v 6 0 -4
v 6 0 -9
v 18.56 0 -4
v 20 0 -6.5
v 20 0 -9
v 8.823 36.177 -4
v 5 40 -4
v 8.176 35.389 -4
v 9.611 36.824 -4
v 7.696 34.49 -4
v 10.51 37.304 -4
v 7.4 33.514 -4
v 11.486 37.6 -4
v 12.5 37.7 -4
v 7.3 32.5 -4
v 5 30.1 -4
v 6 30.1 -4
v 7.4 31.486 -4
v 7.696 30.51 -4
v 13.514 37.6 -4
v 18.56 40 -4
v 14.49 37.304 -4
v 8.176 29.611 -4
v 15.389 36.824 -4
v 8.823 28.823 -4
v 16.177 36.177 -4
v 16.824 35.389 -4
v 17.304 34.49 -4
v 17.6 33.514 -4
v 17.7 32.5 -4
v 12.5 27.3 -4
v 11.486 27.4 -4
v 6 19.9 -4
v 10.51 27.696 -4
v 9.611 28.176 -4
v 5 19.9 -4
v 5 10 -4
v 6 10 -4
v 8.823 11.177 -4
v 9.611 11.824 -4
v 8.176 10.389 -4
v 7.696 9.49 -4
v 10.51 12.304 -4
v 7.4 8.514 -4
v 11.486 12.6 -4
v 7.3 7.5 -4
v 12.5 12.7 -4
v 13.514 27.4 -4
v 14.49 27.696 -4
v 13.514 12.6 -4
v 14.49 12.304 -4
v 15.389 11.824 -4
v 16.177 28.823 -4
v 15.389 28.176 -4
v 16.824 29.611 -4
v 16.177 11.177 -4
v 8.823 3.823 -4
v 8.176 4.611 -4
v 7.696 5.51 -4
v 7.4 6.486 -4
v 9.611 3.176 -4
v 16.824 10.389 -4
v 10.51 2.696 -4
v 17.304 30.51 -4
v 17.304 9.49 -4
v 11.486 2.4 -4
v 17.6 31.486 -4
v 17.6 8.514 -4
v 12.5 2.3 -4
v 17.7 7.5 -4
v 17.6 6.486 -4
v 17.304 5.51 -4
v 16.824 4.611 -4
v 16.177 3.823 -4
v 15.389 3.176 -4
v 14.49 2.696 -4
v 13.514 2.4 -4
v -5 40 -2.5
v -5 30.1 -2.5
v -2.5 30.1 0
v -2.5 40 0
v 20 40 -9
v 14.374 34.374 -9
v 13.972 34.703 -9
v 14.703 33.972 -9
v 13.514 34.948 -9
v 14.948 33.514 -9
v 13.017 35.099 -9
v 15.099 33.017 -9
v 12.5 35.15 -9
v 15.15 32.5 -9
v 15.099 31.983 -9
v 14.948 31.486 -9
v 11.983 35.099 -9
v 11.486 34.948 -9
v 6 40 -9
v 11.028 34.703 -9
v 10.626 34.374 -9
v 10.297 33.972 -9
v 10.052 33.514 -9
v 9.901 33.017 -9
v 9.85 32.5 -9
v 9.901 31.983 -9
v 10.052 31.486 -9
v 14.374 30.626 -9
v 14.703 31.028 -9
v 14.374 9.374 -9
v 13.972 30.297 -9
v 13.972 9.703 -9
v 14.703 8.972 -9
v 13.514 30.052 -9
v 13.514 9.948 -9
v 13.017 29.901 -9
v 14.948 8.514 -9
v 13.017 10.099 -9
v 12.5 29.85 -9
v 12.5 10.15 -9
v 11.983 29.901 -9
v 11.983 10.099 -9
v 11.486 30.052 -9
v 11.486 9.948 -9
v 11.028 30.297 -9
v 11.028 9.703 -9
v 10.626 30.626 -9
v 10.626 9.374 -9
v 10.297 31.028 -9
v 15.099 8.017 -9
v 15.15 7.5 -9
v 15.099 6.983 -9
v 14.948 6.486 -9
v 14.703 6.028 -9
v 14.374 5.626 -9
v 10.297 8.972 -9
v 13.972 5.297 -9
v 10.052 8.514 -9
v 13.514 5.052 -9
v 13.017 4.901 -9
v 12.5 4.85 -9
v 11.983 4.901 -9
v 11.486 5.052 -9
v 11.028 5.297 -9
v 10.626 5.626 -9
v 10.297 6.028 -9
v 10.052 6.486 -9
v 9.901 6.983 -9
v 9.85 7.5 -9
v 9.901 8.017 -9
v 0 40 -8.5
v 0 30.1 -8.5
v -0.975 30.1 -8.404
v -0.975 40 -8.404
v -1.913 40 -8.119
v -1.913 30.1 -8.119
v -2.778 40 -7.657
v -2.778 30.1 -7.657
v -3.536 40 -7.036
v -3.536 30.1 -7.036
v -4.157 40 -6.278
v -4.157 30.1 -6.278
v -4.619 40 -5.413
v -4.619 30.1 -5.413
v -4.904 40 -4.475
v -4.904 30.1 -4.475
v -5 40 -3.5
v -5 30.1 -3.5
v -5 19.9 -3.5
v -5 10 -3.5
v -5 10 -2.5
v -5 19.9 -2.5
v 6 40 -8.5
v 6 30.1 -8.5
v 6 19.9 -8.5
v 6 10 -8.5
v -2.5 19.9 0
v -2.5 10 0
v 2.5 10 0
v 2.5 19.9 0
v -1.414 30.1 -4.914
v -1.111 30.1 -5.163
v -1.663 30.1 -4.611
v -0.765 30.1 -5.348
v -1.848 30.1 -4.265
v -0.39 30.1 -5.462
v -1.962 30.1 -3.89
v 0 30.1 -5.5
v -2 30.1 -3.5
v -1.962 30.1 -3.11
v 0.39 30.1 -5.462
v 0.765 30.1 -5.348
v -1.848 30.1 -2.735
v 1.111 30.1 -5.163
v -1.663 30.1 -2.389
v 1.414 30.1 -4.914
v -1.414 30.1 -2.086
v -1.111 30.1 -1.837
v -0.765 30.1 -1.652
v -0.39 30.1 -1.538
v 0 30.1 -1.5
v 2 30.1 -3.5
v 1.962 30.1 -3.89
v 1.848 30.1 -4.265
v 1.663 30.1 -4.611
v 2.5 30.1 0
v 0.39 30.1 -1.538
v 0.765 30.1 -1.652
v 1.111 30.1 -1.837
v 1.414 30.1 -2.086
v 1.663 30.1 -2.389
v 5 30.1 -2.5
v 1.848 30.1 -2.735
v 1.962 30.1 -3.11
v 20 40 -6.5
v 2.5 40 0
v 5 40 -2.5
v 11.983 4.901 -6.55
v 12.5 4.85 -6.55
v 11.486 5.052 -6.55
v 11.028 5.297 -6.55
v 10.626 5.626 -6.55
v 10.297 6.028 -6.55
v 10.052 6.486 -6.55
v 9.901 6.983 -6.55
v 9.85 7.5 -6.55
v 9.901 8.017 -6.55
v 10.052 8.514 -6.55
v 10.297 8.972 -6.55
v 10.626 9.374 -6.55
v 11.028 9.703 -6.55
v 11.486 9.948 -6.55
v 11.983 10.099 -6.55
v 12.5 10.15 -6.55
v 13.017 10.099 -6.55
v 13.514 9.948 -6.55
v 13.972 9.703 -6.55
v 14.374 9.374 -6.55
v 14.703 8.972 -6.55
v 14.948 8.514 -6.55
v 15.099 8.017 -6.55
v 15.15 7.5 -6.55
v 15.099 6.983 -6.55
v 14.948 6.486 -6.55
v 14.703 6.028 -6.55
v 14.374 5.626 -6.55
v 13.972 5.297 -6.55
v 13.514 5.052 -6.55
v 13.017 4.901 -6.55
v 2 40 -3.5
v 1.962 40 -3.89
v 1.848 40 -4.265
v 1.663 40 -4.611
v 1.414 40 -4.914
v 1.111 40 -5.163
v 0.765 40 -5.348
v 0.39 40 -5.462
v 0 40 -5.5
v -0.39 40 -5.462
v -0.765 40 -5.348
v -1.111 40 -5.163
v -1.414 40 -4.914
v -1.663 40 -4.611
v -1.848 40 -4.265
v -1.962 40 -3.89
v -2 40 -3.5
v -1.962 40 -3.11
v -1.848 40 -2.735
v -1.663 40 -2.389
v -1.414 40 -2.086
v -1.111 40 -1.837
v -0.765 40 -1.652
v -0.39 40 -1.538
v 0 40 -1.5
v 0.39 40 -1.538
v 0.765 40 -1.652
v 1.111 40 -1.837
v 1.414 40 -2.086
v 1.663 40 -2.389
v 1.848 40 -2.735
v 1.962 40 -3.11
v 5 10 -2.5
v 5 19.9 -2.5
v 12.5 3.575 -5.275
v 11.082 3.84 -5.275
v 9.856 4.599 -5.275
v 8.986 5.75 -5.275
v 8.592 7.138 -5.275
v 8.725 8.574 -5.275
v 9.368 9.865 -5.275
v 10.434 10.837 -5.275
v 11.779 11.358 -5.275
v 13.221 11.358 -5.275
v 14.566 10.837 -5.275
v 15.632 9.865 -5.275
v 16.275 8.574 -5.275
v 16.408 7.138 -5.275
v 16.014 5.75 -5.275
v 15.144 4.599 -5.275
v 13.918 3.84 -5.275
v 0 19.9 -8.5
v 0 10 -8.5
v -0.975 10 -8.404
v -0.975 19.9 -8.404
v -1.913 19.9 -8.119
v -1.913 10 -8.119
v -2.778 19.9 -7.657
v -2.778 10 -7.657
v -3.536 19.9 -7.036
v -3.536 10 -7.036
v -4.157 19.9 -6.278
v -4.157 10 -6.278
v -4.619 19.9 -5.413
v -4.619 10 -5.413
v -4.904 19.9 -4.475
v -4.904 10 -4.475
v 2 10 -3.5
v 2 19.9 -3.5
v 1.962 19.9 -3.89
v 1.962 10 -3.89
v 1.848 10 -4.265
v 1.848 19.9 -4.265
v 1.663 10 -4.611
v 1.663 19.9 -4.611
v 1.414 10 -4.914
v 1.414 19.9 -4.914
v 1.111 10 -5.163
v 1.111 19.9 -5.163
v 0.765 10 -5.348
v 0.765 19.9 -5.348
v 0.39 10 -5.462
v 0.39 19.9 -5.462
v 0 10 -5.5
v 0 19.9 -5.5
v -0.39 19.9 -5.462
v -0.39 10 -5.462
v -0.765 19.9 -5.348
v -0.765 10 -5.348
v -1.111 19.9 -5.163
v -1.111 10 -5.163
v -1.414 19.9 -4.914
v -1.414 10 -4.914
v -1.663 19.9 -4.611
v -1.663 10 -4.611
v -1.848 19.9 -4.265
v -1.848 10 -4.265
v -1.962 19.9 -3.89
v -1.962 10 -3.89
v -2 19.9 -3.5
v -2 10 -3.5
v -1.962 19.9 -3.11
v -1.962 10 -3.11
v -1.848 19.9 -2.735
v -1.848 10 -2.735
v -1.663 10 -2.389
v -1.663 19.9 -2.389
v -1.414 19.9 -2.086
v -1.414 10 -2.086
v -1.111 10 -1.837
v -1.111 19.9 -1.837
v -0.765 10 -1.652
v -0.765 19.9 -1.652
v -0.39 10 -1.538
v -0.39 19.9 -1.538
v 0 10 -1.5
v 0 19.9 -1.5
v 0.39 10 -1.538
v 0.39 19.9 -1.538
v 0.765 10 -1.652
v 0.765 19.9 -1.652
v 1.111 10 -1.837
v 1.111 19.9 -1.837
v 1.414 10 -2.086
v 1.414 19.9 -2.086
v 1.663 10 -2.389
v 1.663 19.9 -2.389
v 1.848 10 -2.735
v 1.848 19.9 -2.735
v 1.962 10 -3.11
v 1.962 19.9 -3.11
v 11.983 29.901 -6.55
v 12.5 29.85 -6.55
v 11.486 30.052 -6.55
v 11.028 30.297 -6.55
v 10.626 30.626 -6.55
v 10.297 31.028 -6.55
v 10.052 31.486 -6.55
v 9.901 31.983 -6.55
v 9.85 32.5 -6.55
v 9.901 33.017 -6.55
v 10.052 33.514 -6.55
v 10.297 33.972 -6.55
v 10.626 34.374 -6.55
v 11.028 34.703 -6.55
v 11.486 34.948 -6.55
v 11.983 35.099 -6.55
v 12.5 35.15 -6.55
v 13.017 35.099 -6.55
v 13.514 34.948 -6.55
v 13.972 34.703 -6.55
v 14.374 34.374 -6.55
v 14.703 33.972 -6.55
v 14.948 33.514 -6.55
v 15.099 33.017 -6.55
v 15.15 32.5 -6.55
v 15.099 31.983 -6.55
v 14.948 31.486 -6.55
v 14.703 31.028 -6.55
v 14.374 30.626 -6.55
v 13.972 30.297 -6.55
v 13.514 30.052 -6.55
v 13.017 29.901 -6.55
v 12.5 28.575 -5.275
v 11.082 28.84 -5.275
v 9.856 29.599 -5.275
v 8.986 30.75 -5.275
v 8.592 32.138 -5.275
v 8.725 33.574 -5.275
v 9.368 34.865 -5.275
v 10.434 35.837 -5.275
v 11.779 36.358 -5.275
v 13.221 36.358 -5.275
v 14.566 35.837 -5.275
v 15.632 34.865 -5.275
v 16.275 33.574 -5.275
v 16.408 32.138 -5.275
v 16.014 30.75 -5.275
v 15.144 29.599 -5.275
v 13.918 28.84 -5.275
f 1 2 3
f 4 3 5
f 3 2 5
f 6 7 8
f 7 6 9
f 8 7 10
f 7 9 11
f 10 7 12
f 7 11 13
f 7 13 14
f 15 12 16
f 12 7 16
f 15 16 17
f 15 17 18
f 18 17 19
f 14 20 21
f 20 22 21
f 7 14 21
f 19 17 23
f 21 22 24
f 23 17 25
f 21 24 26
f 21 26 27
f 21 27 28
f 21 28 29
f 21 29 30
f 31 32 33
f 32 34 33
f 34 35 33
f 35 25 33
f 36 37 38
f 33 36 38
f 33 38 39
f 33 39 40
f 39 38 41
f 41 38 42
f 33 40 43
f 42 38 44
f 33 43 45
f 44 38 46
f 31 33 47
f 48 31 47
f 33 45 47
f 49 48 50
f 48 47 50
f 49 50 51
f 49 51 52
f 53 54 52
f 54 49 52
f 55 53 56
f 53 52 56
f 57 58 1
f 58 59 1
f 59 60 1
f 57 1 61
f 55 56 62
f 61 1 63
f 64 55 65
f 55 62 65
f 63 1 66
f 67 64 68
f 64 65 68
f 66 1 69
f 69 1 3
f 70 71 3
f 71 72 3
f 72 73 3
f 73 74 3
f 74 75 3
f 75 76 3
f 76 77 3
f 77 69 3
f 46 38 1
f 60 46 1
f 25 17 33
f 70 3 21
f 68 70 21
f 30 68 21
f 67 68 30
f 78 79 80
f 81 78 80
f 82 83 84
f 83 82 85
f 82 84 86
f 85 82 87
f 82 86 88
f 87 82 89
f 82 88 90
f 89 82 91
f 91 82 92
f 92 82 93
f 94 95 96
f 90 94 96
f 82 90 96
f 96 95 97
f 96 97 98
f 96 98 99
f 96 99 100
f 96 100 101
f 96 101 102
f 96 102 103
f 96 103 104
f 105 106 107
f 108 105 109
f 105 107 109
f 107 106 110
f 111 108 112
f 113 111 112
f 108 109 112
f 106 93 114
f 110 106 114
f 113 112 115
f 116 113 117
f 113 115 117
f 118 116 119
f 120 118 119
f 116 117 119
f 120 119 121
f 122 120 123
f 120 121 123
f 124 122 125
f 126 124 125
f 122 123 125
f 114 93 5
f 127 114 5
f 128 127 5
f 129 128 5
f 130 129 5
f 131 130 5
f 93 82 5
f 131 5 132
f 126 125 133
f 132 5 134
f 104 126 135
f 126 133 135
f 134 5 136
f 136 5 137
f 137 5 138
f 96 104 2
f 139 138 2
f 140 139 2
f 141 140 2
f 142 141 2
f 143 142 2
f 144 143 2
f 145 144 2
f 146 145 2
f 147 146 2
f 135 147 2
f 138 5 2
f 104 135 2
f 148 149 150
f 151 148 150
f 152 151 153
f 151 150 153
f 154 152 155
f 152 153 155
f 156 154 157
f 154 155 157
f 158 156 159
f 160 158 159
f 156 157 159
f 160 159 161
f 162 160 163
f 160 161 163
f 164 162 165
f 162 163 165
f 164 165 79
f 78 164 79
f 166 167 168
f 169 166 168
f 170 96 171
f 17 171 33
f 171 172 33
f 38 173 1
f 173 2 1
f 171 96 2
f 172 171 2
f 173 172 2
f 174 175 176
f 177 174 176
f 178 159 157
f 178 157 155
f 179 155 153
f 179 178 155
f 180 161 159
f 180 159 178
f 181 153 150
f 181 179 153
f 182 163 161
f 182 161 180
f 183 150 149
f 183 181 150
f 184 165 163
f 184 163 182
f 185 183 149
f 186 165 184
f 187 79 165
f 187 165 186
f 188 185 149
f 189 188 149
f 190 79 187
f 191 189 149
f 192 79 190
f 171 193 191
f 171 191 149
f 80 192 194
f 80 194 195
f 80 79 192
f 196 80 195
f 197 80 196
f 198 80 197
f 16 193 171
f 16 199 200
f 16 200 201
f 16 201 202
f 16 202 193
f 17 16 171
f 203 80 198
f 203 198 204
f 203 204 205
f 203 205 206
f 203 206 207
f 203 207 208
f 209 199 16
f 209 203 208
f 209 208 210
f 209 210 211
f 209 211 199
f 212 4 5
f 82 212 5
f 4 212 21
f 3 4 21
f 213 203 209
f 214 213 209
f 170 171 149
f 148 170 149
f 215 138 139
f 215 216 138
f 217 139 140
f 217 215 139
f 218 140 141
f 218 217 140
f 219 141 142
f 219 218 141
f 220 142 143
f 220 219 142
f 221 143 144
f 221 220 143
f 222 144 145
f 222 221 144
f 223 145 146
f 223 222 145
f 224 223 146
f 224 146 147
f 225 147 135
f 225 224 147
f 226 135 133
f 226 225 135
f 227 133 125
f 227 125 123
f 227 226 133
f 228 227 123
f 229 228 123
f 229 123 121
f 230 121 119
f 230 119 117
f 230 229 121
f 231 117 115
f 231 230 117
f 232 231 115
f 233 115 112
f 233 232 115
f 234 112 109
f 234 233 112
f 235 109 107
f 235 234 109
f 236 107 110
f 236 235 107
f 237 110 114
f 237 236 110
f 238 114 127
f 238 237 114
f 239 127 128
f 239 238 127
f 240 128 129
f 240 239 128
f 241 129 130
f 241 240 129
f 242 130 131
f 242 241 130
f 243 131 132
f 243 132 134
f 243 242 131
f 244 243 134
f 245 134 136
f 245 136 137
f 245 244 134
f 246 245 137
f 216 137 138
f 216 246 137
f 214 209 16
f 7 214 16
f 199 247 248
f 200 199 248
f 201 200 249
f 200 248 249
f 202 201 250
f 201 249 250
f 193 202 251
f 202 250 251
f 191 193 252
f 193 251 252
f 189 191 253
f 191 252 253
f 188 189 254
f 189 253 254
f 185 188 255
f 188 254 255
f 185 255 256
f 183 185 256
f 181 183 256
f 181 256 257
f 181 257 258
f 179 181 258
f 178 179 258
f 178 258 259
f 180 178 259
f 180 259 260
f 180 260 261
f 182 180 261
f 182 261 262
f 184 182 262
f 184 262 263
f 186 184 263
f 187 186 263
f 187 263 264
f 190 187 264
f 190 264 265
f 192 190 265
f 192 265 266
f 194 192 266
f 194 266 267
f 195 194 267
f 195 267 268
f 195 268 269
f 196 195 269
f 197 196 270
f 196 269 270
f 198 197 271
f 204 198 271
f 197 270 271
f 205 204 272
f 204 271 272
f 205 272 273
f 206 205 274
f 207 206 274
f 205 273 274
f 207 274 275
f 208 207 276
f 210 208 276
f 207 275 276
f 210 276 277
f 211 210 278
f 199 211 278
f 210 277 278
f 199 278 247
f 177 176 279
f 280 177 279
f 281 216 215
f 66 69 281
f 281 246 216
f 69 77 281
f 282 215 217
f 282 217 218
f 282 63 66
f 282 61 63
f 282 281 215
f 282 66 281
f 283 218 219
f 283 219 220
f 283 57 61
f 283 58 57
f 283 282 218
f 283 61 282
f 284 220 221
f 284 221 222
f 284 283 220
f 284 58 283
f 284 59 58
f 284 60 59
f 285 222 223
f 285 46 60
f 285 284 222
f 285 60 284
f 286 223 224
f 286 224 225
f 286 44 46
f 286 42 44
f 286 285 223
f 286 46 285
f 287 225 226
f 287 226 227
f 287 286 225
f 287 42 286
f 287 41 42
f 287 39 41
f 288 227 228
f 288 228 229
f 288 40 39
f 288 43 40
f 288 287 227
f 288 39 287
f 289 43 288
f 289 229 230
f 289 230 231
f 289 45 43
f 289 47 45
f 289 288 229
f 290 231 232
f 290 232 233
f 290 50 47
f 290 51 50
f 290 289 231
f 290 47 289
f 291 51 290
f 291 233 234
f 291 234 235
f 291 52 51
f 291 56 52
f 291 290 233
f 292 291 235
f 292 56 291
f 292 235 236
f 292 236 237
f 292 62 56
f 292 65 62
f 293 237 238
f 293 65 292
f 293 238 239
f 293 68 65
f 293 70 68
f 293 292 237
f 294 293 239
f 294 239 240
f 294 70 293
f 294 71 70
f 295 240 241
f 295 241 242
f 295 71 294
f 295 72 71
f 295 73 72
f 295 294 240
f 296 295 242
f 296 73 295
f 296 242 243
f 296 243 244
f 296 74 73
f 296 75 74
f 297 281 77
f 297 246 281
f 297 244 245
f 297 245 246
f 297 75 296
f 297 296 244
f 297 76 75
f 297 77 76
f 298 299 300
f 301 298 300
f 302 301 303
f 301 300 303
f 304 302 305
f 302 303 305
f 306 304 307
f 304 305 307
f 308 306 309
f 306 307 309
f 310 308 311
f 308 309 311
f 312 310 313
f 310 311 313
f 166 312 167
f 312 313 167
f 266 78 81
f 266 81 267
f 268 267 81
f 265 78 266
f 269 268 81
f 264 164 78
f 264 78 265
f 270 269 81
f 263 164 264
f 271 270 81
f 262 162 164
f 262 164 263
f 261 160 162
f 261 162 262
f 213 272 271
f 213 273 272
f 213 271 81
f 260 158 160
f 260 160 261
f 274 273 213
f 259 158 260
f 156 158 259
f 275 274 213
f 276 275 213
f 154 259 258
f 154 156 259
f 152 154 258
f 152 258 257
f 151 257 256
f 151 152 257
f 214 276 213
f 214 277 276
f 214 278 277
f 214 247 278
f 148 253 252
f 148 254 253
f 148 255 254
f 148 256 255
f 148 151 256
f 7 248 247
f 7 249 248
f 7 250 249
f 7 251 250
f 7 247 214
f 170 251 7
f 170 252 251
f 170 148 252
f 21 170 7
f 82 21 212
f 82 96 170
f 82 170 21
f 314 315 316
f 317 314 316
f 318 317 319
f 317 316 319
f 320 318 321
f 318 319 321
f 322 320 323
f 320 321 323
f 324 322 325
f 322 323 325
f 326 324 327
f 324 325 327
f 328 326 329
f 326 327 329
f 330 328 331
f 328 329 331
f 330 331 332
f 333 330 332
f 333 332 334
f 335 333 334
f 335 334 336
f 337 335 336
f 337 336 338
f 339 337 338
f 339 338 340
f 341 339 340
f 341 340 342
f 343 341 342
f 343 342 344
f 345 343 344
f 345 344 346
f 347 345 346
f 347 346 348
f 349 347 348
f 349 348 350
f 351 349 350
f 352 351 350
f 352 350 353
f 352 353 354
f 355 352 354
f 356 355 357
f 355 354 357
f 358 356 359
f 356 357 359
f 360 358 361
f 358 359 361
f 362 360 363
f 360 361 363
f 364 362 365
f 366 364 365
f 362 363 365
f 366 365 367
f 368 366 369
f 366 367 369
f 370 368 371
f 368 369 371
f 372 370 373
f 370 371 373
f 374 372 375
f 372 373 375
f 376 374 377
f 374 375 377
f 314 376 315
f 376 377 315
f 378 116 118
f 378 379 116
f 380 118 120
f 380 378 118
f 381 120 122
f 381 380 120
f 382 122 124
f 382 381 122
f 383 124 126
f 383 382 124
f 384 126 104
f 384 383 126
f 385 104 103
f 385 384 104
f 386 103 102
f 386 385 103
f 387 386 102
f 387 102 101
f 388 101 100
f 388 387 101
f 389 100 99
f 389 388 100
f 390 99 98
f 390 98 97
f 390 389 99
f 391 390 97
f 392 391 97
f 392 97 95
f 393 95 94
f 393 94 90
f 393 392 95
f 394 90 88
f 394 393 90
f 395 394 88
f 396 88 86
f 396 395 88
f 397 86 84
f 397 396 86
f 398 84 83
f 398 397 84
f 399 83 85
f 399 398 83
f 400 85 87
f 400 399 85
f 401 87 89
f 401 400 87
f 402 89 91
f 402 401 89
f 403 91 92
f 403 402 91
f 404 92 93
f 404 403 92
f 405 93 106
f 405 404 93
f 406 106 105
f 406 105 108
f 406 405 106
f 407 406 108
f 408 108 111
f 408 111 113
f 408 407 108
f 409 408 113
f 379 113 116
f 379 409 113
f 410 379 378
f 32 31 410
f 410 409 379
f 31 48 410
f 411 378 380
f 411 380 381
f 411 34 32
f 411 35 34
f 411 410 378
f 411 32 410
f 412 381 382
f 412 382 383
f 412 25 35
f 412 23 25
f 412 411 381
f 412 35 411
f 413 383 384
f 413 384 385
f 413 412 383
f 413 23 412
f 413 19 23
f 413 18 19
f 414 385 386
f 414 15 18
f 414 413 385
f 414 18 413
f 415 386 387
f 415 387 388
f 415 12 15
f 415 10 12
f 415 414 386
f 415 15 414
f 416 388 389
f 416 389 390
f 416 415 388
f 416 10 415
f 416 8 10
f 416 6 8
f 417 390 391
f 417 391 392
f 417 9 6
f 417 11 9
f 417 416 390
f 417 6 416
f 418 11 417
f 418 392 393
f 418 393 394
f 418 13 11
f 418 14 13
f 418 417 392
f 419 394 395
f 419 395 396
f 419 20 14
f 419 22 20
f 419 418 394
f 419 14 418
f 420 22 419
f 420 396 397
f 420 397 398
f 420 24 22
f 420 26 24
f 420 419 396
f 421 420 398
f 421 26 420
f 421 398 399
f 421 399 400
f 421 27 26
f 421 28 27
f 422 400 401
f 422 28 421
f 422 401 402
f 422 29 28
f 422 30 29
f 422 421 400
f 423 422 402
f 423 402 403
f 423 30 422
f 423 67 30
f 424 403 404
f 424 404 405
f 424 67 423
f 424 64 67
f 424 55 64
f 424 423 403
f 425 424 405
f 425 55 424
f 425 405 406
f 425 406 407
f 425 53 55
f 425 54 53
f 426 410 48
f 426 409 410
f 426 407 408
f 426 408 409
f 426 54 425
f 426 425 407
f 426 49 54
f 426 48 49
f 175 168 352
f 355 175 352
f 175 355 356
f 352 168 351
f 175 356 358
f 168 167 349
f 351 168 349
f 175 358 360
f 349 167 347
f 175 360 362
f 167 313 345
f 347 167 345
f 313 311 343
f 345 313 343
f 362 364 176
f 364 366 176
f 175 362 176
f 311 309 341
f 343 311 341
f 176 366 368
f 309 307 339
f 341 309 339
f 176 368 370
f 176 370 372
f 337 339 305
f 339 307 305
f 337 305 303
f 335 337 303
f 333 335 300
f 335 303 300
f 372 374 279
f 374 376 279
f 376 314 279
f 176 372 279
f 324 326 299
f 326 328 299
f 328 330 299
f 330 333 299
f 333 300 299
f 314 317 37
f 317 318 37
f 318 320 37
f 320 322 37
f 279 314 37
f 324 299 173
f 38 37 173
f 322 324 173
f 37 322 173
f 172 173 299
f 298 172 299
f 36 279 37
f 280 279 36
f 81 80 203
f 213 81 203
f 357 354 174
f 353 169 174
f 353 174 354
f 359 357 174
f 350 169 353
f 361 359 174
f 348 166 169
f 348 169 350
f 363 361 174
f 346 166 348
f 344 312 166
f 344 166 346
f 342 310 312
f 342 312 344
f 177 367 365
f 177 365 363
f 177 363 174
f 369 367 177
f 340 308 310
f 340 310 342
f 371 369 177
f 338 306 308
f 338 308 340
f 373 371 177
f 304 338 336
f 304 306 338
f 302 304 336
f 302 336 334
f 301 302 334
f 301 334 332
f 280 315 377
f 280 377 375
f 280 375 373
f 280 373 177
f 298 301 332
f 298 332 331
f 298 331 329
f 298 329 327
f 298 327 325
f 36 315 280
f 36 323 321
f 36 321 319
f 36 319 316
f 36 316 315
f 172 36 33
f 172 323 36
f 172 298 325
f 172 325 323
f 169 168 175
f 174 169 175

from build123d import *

# Parameters (mm, degrees)
BOSS_EXTRUDE1_DEPTH                            = 40
CUT_EXTRUDE1_DEPTH                             = 40
CSK_FOR_M5_FLAT_HEAD_MACHINE_SCREW1_AT_2_COUNT = 2
CSK_FOR_M5_FLAT_HEAD_MACHINE_SCREW1_AT_2_PITCH = 25
SKETCH7_R                                      = 2
CUT_EXTRUDE2_DEPTH                             = 40
SKETCH8_W                                      = 1
SKETCH8_H                                      = 10.2
CUT_EXTRUDE3_DEPTH                             = 10
SKETCH9_W                                      = 11.70124712
SKETCH9_H                                      = 10.2
CUT_EXTRUDE4_DEPTH                             = 10
CUT_EXTRUDE4_DEPTH_BACK                        = 10
SKETCH10_W                                     = 1
SKETCH10_H                                     = 10
CUT_EXTRUDE5_DEPTH                             = 10
SKETCH11_W                                     = 12.165826364
SKETCH11_H                                     = 10.874220792
CUT_EXTRUDE6_DEPTH                             = 10
CUT_EXTRUDE6_DEPTH_BACK                        = 10


with BuildPart() as part:
    # Sketch2 → Boss-Extrude1 (new body)
    with BuildSketch(Plane(origin=(0, 0, 0), x_dir=(1, 0, 0), z_dir=(0, 1, 0))):
        with BuildLine():
            Line((-2.5, 0), (2.5, 0))
            Line((2.5, 0), (5, 2.5))
            Line((5, 2.5), (5, 4))
            Line((5, 4), (20, 4))
            Line((20, 4), (20, 9))
            Line((20, 9), (6, 9))
            Line((6, 9), (6, 8.5))
            Line((6, 8.5), (0, 8.5))
            ThreePointArc((0, 8.5), (-3.535533906, 7.035533906), (-5, 3.5))
            Line((-5, 3.5), (-5, 2.5))
            Line((-5, 2.5), (-2.5, 0))
        make_face()
    extrude(amount=BOSS_EXTRUDE1_DEPTH)

    # Sketch3 → Cut-Extrude1 (cut)
    with BuildSketch(Plane(origin=(0, 40, 0), x_dir=(1, 0, 0), z_dir=(0, 1, 0))):
        Polygon((20, 6.5), (18.56, 4), (20, 4), align=None)
    extrude(amount=-CUT_EXTRUDE1_DEPTH, mode=Mode.SUBTRACT)

    # Sketch6 → CSK for M5 Flat Head Machine Screw1 (revolve, cut)
    with BuildSketch(Plane(origin=(12.5, 32.5, -4), x_dir=(0, -1, 0), z_dir=(1, 0, 0))):
        Polygon((0, 0), (0, 5), (2.65, 5), (2.65, 2.55), (5.2, 0), align=None)
    csk_for_m5_flat_head_machine_screw1 = revolve(axis=Axis((12.5, 32.5, 2.35), (0, 0, -1)), mode=Mode.SUBTRACT)

    # CSK for M5 Flat Head Machine Screw1 at 2: CSK for M5 Flat Head Machine Screw1 ×2
    with Locations(*[(0, -i * CSK_FOR_M5_FLAT_HEAD_MACHINE_SCREW1_AT_2_PITCH, 0) for i in range(1, CSK_FOR_M5_FLAT_HEAD_MACHINE_SCREW1_AT_2_COUNT)]):
        add(csk_for_m5_flat_head_machine_screw1, mode=Mode.SUBTRACT)

    # Sketch7 → Cut-Extrude2 (cut)
    with BuildSketch(Plane(origin=(0, 40, 0), x_dir=(1, 0, 0), z_dir=(0, 1, 0))):
        with Locations((0, 3.5)):
            Circle(SKETCH7_R)
    extrude(amount=-CUT_EXTRUDE2_DEPTH, mode=Mode.SUBTRACT)

    # Sketch8 → Cut-Extrude3 (cut)
    with BuildSketch(Plane.XY.offset(-4)):
        with Locations((5.5, 25)):
            Rectangle(SKETCH8_W, SKETCH8_H)
    extrude(amount=-CUT_EXTRUDE3_DEPTH, mode=Mode.SUBTRACT)

    # Sketch9 → Cut-Extrude4 (cut, two sides)
    with BuildSketch(Plane.XY.offset(-4)) as cut_extrude4_sk:
        with Locations((0.14937644, 25)):
            Rectangle(SKETCH9_W, SKETCH9_H)
    extrude(amount=CUT_EXTRUDE4_DEPTH, mode=Mode.SUBTRACT)
    extrude(cut_extrude4_sk.sketch, amount=-CUT_EXTRUDE4_DEPTH_BACK, mode=Mode.SUBTRACT)

    # Sketch10 → Cut-Extrude5 (cut)
    with BuildSketch(Plane.XY.offset(-4)):
        with Locations((5.5, 5)):
            Rectangle(SKETCH10_W, SKETCH10_H)
    extrude(amount=-CUT_EXTRUDE5_DEPTH, mode=Mode.SUBTRACT)

    # Sketch11 → Cut-Extrude6 (cut, two sides)
    with BuildSketch(Plane.XY.offset(-4)) as cut_extrude6_sk:
        with Locations((-0.082913182, 4.562889604)):
            Rectangle(SKETCH11_W, SKETCH11_H)
    extrude(amount=CUT_EXTRUDE6_DEPTH, mode=Mode.SUBTRACT)
    extrude(cut_extrude6_sk.sketch, amount=-CUT_EXTRUDE6_DEPTH_BACK, mode=Mode.SUBTRACT)


solid = part.part
